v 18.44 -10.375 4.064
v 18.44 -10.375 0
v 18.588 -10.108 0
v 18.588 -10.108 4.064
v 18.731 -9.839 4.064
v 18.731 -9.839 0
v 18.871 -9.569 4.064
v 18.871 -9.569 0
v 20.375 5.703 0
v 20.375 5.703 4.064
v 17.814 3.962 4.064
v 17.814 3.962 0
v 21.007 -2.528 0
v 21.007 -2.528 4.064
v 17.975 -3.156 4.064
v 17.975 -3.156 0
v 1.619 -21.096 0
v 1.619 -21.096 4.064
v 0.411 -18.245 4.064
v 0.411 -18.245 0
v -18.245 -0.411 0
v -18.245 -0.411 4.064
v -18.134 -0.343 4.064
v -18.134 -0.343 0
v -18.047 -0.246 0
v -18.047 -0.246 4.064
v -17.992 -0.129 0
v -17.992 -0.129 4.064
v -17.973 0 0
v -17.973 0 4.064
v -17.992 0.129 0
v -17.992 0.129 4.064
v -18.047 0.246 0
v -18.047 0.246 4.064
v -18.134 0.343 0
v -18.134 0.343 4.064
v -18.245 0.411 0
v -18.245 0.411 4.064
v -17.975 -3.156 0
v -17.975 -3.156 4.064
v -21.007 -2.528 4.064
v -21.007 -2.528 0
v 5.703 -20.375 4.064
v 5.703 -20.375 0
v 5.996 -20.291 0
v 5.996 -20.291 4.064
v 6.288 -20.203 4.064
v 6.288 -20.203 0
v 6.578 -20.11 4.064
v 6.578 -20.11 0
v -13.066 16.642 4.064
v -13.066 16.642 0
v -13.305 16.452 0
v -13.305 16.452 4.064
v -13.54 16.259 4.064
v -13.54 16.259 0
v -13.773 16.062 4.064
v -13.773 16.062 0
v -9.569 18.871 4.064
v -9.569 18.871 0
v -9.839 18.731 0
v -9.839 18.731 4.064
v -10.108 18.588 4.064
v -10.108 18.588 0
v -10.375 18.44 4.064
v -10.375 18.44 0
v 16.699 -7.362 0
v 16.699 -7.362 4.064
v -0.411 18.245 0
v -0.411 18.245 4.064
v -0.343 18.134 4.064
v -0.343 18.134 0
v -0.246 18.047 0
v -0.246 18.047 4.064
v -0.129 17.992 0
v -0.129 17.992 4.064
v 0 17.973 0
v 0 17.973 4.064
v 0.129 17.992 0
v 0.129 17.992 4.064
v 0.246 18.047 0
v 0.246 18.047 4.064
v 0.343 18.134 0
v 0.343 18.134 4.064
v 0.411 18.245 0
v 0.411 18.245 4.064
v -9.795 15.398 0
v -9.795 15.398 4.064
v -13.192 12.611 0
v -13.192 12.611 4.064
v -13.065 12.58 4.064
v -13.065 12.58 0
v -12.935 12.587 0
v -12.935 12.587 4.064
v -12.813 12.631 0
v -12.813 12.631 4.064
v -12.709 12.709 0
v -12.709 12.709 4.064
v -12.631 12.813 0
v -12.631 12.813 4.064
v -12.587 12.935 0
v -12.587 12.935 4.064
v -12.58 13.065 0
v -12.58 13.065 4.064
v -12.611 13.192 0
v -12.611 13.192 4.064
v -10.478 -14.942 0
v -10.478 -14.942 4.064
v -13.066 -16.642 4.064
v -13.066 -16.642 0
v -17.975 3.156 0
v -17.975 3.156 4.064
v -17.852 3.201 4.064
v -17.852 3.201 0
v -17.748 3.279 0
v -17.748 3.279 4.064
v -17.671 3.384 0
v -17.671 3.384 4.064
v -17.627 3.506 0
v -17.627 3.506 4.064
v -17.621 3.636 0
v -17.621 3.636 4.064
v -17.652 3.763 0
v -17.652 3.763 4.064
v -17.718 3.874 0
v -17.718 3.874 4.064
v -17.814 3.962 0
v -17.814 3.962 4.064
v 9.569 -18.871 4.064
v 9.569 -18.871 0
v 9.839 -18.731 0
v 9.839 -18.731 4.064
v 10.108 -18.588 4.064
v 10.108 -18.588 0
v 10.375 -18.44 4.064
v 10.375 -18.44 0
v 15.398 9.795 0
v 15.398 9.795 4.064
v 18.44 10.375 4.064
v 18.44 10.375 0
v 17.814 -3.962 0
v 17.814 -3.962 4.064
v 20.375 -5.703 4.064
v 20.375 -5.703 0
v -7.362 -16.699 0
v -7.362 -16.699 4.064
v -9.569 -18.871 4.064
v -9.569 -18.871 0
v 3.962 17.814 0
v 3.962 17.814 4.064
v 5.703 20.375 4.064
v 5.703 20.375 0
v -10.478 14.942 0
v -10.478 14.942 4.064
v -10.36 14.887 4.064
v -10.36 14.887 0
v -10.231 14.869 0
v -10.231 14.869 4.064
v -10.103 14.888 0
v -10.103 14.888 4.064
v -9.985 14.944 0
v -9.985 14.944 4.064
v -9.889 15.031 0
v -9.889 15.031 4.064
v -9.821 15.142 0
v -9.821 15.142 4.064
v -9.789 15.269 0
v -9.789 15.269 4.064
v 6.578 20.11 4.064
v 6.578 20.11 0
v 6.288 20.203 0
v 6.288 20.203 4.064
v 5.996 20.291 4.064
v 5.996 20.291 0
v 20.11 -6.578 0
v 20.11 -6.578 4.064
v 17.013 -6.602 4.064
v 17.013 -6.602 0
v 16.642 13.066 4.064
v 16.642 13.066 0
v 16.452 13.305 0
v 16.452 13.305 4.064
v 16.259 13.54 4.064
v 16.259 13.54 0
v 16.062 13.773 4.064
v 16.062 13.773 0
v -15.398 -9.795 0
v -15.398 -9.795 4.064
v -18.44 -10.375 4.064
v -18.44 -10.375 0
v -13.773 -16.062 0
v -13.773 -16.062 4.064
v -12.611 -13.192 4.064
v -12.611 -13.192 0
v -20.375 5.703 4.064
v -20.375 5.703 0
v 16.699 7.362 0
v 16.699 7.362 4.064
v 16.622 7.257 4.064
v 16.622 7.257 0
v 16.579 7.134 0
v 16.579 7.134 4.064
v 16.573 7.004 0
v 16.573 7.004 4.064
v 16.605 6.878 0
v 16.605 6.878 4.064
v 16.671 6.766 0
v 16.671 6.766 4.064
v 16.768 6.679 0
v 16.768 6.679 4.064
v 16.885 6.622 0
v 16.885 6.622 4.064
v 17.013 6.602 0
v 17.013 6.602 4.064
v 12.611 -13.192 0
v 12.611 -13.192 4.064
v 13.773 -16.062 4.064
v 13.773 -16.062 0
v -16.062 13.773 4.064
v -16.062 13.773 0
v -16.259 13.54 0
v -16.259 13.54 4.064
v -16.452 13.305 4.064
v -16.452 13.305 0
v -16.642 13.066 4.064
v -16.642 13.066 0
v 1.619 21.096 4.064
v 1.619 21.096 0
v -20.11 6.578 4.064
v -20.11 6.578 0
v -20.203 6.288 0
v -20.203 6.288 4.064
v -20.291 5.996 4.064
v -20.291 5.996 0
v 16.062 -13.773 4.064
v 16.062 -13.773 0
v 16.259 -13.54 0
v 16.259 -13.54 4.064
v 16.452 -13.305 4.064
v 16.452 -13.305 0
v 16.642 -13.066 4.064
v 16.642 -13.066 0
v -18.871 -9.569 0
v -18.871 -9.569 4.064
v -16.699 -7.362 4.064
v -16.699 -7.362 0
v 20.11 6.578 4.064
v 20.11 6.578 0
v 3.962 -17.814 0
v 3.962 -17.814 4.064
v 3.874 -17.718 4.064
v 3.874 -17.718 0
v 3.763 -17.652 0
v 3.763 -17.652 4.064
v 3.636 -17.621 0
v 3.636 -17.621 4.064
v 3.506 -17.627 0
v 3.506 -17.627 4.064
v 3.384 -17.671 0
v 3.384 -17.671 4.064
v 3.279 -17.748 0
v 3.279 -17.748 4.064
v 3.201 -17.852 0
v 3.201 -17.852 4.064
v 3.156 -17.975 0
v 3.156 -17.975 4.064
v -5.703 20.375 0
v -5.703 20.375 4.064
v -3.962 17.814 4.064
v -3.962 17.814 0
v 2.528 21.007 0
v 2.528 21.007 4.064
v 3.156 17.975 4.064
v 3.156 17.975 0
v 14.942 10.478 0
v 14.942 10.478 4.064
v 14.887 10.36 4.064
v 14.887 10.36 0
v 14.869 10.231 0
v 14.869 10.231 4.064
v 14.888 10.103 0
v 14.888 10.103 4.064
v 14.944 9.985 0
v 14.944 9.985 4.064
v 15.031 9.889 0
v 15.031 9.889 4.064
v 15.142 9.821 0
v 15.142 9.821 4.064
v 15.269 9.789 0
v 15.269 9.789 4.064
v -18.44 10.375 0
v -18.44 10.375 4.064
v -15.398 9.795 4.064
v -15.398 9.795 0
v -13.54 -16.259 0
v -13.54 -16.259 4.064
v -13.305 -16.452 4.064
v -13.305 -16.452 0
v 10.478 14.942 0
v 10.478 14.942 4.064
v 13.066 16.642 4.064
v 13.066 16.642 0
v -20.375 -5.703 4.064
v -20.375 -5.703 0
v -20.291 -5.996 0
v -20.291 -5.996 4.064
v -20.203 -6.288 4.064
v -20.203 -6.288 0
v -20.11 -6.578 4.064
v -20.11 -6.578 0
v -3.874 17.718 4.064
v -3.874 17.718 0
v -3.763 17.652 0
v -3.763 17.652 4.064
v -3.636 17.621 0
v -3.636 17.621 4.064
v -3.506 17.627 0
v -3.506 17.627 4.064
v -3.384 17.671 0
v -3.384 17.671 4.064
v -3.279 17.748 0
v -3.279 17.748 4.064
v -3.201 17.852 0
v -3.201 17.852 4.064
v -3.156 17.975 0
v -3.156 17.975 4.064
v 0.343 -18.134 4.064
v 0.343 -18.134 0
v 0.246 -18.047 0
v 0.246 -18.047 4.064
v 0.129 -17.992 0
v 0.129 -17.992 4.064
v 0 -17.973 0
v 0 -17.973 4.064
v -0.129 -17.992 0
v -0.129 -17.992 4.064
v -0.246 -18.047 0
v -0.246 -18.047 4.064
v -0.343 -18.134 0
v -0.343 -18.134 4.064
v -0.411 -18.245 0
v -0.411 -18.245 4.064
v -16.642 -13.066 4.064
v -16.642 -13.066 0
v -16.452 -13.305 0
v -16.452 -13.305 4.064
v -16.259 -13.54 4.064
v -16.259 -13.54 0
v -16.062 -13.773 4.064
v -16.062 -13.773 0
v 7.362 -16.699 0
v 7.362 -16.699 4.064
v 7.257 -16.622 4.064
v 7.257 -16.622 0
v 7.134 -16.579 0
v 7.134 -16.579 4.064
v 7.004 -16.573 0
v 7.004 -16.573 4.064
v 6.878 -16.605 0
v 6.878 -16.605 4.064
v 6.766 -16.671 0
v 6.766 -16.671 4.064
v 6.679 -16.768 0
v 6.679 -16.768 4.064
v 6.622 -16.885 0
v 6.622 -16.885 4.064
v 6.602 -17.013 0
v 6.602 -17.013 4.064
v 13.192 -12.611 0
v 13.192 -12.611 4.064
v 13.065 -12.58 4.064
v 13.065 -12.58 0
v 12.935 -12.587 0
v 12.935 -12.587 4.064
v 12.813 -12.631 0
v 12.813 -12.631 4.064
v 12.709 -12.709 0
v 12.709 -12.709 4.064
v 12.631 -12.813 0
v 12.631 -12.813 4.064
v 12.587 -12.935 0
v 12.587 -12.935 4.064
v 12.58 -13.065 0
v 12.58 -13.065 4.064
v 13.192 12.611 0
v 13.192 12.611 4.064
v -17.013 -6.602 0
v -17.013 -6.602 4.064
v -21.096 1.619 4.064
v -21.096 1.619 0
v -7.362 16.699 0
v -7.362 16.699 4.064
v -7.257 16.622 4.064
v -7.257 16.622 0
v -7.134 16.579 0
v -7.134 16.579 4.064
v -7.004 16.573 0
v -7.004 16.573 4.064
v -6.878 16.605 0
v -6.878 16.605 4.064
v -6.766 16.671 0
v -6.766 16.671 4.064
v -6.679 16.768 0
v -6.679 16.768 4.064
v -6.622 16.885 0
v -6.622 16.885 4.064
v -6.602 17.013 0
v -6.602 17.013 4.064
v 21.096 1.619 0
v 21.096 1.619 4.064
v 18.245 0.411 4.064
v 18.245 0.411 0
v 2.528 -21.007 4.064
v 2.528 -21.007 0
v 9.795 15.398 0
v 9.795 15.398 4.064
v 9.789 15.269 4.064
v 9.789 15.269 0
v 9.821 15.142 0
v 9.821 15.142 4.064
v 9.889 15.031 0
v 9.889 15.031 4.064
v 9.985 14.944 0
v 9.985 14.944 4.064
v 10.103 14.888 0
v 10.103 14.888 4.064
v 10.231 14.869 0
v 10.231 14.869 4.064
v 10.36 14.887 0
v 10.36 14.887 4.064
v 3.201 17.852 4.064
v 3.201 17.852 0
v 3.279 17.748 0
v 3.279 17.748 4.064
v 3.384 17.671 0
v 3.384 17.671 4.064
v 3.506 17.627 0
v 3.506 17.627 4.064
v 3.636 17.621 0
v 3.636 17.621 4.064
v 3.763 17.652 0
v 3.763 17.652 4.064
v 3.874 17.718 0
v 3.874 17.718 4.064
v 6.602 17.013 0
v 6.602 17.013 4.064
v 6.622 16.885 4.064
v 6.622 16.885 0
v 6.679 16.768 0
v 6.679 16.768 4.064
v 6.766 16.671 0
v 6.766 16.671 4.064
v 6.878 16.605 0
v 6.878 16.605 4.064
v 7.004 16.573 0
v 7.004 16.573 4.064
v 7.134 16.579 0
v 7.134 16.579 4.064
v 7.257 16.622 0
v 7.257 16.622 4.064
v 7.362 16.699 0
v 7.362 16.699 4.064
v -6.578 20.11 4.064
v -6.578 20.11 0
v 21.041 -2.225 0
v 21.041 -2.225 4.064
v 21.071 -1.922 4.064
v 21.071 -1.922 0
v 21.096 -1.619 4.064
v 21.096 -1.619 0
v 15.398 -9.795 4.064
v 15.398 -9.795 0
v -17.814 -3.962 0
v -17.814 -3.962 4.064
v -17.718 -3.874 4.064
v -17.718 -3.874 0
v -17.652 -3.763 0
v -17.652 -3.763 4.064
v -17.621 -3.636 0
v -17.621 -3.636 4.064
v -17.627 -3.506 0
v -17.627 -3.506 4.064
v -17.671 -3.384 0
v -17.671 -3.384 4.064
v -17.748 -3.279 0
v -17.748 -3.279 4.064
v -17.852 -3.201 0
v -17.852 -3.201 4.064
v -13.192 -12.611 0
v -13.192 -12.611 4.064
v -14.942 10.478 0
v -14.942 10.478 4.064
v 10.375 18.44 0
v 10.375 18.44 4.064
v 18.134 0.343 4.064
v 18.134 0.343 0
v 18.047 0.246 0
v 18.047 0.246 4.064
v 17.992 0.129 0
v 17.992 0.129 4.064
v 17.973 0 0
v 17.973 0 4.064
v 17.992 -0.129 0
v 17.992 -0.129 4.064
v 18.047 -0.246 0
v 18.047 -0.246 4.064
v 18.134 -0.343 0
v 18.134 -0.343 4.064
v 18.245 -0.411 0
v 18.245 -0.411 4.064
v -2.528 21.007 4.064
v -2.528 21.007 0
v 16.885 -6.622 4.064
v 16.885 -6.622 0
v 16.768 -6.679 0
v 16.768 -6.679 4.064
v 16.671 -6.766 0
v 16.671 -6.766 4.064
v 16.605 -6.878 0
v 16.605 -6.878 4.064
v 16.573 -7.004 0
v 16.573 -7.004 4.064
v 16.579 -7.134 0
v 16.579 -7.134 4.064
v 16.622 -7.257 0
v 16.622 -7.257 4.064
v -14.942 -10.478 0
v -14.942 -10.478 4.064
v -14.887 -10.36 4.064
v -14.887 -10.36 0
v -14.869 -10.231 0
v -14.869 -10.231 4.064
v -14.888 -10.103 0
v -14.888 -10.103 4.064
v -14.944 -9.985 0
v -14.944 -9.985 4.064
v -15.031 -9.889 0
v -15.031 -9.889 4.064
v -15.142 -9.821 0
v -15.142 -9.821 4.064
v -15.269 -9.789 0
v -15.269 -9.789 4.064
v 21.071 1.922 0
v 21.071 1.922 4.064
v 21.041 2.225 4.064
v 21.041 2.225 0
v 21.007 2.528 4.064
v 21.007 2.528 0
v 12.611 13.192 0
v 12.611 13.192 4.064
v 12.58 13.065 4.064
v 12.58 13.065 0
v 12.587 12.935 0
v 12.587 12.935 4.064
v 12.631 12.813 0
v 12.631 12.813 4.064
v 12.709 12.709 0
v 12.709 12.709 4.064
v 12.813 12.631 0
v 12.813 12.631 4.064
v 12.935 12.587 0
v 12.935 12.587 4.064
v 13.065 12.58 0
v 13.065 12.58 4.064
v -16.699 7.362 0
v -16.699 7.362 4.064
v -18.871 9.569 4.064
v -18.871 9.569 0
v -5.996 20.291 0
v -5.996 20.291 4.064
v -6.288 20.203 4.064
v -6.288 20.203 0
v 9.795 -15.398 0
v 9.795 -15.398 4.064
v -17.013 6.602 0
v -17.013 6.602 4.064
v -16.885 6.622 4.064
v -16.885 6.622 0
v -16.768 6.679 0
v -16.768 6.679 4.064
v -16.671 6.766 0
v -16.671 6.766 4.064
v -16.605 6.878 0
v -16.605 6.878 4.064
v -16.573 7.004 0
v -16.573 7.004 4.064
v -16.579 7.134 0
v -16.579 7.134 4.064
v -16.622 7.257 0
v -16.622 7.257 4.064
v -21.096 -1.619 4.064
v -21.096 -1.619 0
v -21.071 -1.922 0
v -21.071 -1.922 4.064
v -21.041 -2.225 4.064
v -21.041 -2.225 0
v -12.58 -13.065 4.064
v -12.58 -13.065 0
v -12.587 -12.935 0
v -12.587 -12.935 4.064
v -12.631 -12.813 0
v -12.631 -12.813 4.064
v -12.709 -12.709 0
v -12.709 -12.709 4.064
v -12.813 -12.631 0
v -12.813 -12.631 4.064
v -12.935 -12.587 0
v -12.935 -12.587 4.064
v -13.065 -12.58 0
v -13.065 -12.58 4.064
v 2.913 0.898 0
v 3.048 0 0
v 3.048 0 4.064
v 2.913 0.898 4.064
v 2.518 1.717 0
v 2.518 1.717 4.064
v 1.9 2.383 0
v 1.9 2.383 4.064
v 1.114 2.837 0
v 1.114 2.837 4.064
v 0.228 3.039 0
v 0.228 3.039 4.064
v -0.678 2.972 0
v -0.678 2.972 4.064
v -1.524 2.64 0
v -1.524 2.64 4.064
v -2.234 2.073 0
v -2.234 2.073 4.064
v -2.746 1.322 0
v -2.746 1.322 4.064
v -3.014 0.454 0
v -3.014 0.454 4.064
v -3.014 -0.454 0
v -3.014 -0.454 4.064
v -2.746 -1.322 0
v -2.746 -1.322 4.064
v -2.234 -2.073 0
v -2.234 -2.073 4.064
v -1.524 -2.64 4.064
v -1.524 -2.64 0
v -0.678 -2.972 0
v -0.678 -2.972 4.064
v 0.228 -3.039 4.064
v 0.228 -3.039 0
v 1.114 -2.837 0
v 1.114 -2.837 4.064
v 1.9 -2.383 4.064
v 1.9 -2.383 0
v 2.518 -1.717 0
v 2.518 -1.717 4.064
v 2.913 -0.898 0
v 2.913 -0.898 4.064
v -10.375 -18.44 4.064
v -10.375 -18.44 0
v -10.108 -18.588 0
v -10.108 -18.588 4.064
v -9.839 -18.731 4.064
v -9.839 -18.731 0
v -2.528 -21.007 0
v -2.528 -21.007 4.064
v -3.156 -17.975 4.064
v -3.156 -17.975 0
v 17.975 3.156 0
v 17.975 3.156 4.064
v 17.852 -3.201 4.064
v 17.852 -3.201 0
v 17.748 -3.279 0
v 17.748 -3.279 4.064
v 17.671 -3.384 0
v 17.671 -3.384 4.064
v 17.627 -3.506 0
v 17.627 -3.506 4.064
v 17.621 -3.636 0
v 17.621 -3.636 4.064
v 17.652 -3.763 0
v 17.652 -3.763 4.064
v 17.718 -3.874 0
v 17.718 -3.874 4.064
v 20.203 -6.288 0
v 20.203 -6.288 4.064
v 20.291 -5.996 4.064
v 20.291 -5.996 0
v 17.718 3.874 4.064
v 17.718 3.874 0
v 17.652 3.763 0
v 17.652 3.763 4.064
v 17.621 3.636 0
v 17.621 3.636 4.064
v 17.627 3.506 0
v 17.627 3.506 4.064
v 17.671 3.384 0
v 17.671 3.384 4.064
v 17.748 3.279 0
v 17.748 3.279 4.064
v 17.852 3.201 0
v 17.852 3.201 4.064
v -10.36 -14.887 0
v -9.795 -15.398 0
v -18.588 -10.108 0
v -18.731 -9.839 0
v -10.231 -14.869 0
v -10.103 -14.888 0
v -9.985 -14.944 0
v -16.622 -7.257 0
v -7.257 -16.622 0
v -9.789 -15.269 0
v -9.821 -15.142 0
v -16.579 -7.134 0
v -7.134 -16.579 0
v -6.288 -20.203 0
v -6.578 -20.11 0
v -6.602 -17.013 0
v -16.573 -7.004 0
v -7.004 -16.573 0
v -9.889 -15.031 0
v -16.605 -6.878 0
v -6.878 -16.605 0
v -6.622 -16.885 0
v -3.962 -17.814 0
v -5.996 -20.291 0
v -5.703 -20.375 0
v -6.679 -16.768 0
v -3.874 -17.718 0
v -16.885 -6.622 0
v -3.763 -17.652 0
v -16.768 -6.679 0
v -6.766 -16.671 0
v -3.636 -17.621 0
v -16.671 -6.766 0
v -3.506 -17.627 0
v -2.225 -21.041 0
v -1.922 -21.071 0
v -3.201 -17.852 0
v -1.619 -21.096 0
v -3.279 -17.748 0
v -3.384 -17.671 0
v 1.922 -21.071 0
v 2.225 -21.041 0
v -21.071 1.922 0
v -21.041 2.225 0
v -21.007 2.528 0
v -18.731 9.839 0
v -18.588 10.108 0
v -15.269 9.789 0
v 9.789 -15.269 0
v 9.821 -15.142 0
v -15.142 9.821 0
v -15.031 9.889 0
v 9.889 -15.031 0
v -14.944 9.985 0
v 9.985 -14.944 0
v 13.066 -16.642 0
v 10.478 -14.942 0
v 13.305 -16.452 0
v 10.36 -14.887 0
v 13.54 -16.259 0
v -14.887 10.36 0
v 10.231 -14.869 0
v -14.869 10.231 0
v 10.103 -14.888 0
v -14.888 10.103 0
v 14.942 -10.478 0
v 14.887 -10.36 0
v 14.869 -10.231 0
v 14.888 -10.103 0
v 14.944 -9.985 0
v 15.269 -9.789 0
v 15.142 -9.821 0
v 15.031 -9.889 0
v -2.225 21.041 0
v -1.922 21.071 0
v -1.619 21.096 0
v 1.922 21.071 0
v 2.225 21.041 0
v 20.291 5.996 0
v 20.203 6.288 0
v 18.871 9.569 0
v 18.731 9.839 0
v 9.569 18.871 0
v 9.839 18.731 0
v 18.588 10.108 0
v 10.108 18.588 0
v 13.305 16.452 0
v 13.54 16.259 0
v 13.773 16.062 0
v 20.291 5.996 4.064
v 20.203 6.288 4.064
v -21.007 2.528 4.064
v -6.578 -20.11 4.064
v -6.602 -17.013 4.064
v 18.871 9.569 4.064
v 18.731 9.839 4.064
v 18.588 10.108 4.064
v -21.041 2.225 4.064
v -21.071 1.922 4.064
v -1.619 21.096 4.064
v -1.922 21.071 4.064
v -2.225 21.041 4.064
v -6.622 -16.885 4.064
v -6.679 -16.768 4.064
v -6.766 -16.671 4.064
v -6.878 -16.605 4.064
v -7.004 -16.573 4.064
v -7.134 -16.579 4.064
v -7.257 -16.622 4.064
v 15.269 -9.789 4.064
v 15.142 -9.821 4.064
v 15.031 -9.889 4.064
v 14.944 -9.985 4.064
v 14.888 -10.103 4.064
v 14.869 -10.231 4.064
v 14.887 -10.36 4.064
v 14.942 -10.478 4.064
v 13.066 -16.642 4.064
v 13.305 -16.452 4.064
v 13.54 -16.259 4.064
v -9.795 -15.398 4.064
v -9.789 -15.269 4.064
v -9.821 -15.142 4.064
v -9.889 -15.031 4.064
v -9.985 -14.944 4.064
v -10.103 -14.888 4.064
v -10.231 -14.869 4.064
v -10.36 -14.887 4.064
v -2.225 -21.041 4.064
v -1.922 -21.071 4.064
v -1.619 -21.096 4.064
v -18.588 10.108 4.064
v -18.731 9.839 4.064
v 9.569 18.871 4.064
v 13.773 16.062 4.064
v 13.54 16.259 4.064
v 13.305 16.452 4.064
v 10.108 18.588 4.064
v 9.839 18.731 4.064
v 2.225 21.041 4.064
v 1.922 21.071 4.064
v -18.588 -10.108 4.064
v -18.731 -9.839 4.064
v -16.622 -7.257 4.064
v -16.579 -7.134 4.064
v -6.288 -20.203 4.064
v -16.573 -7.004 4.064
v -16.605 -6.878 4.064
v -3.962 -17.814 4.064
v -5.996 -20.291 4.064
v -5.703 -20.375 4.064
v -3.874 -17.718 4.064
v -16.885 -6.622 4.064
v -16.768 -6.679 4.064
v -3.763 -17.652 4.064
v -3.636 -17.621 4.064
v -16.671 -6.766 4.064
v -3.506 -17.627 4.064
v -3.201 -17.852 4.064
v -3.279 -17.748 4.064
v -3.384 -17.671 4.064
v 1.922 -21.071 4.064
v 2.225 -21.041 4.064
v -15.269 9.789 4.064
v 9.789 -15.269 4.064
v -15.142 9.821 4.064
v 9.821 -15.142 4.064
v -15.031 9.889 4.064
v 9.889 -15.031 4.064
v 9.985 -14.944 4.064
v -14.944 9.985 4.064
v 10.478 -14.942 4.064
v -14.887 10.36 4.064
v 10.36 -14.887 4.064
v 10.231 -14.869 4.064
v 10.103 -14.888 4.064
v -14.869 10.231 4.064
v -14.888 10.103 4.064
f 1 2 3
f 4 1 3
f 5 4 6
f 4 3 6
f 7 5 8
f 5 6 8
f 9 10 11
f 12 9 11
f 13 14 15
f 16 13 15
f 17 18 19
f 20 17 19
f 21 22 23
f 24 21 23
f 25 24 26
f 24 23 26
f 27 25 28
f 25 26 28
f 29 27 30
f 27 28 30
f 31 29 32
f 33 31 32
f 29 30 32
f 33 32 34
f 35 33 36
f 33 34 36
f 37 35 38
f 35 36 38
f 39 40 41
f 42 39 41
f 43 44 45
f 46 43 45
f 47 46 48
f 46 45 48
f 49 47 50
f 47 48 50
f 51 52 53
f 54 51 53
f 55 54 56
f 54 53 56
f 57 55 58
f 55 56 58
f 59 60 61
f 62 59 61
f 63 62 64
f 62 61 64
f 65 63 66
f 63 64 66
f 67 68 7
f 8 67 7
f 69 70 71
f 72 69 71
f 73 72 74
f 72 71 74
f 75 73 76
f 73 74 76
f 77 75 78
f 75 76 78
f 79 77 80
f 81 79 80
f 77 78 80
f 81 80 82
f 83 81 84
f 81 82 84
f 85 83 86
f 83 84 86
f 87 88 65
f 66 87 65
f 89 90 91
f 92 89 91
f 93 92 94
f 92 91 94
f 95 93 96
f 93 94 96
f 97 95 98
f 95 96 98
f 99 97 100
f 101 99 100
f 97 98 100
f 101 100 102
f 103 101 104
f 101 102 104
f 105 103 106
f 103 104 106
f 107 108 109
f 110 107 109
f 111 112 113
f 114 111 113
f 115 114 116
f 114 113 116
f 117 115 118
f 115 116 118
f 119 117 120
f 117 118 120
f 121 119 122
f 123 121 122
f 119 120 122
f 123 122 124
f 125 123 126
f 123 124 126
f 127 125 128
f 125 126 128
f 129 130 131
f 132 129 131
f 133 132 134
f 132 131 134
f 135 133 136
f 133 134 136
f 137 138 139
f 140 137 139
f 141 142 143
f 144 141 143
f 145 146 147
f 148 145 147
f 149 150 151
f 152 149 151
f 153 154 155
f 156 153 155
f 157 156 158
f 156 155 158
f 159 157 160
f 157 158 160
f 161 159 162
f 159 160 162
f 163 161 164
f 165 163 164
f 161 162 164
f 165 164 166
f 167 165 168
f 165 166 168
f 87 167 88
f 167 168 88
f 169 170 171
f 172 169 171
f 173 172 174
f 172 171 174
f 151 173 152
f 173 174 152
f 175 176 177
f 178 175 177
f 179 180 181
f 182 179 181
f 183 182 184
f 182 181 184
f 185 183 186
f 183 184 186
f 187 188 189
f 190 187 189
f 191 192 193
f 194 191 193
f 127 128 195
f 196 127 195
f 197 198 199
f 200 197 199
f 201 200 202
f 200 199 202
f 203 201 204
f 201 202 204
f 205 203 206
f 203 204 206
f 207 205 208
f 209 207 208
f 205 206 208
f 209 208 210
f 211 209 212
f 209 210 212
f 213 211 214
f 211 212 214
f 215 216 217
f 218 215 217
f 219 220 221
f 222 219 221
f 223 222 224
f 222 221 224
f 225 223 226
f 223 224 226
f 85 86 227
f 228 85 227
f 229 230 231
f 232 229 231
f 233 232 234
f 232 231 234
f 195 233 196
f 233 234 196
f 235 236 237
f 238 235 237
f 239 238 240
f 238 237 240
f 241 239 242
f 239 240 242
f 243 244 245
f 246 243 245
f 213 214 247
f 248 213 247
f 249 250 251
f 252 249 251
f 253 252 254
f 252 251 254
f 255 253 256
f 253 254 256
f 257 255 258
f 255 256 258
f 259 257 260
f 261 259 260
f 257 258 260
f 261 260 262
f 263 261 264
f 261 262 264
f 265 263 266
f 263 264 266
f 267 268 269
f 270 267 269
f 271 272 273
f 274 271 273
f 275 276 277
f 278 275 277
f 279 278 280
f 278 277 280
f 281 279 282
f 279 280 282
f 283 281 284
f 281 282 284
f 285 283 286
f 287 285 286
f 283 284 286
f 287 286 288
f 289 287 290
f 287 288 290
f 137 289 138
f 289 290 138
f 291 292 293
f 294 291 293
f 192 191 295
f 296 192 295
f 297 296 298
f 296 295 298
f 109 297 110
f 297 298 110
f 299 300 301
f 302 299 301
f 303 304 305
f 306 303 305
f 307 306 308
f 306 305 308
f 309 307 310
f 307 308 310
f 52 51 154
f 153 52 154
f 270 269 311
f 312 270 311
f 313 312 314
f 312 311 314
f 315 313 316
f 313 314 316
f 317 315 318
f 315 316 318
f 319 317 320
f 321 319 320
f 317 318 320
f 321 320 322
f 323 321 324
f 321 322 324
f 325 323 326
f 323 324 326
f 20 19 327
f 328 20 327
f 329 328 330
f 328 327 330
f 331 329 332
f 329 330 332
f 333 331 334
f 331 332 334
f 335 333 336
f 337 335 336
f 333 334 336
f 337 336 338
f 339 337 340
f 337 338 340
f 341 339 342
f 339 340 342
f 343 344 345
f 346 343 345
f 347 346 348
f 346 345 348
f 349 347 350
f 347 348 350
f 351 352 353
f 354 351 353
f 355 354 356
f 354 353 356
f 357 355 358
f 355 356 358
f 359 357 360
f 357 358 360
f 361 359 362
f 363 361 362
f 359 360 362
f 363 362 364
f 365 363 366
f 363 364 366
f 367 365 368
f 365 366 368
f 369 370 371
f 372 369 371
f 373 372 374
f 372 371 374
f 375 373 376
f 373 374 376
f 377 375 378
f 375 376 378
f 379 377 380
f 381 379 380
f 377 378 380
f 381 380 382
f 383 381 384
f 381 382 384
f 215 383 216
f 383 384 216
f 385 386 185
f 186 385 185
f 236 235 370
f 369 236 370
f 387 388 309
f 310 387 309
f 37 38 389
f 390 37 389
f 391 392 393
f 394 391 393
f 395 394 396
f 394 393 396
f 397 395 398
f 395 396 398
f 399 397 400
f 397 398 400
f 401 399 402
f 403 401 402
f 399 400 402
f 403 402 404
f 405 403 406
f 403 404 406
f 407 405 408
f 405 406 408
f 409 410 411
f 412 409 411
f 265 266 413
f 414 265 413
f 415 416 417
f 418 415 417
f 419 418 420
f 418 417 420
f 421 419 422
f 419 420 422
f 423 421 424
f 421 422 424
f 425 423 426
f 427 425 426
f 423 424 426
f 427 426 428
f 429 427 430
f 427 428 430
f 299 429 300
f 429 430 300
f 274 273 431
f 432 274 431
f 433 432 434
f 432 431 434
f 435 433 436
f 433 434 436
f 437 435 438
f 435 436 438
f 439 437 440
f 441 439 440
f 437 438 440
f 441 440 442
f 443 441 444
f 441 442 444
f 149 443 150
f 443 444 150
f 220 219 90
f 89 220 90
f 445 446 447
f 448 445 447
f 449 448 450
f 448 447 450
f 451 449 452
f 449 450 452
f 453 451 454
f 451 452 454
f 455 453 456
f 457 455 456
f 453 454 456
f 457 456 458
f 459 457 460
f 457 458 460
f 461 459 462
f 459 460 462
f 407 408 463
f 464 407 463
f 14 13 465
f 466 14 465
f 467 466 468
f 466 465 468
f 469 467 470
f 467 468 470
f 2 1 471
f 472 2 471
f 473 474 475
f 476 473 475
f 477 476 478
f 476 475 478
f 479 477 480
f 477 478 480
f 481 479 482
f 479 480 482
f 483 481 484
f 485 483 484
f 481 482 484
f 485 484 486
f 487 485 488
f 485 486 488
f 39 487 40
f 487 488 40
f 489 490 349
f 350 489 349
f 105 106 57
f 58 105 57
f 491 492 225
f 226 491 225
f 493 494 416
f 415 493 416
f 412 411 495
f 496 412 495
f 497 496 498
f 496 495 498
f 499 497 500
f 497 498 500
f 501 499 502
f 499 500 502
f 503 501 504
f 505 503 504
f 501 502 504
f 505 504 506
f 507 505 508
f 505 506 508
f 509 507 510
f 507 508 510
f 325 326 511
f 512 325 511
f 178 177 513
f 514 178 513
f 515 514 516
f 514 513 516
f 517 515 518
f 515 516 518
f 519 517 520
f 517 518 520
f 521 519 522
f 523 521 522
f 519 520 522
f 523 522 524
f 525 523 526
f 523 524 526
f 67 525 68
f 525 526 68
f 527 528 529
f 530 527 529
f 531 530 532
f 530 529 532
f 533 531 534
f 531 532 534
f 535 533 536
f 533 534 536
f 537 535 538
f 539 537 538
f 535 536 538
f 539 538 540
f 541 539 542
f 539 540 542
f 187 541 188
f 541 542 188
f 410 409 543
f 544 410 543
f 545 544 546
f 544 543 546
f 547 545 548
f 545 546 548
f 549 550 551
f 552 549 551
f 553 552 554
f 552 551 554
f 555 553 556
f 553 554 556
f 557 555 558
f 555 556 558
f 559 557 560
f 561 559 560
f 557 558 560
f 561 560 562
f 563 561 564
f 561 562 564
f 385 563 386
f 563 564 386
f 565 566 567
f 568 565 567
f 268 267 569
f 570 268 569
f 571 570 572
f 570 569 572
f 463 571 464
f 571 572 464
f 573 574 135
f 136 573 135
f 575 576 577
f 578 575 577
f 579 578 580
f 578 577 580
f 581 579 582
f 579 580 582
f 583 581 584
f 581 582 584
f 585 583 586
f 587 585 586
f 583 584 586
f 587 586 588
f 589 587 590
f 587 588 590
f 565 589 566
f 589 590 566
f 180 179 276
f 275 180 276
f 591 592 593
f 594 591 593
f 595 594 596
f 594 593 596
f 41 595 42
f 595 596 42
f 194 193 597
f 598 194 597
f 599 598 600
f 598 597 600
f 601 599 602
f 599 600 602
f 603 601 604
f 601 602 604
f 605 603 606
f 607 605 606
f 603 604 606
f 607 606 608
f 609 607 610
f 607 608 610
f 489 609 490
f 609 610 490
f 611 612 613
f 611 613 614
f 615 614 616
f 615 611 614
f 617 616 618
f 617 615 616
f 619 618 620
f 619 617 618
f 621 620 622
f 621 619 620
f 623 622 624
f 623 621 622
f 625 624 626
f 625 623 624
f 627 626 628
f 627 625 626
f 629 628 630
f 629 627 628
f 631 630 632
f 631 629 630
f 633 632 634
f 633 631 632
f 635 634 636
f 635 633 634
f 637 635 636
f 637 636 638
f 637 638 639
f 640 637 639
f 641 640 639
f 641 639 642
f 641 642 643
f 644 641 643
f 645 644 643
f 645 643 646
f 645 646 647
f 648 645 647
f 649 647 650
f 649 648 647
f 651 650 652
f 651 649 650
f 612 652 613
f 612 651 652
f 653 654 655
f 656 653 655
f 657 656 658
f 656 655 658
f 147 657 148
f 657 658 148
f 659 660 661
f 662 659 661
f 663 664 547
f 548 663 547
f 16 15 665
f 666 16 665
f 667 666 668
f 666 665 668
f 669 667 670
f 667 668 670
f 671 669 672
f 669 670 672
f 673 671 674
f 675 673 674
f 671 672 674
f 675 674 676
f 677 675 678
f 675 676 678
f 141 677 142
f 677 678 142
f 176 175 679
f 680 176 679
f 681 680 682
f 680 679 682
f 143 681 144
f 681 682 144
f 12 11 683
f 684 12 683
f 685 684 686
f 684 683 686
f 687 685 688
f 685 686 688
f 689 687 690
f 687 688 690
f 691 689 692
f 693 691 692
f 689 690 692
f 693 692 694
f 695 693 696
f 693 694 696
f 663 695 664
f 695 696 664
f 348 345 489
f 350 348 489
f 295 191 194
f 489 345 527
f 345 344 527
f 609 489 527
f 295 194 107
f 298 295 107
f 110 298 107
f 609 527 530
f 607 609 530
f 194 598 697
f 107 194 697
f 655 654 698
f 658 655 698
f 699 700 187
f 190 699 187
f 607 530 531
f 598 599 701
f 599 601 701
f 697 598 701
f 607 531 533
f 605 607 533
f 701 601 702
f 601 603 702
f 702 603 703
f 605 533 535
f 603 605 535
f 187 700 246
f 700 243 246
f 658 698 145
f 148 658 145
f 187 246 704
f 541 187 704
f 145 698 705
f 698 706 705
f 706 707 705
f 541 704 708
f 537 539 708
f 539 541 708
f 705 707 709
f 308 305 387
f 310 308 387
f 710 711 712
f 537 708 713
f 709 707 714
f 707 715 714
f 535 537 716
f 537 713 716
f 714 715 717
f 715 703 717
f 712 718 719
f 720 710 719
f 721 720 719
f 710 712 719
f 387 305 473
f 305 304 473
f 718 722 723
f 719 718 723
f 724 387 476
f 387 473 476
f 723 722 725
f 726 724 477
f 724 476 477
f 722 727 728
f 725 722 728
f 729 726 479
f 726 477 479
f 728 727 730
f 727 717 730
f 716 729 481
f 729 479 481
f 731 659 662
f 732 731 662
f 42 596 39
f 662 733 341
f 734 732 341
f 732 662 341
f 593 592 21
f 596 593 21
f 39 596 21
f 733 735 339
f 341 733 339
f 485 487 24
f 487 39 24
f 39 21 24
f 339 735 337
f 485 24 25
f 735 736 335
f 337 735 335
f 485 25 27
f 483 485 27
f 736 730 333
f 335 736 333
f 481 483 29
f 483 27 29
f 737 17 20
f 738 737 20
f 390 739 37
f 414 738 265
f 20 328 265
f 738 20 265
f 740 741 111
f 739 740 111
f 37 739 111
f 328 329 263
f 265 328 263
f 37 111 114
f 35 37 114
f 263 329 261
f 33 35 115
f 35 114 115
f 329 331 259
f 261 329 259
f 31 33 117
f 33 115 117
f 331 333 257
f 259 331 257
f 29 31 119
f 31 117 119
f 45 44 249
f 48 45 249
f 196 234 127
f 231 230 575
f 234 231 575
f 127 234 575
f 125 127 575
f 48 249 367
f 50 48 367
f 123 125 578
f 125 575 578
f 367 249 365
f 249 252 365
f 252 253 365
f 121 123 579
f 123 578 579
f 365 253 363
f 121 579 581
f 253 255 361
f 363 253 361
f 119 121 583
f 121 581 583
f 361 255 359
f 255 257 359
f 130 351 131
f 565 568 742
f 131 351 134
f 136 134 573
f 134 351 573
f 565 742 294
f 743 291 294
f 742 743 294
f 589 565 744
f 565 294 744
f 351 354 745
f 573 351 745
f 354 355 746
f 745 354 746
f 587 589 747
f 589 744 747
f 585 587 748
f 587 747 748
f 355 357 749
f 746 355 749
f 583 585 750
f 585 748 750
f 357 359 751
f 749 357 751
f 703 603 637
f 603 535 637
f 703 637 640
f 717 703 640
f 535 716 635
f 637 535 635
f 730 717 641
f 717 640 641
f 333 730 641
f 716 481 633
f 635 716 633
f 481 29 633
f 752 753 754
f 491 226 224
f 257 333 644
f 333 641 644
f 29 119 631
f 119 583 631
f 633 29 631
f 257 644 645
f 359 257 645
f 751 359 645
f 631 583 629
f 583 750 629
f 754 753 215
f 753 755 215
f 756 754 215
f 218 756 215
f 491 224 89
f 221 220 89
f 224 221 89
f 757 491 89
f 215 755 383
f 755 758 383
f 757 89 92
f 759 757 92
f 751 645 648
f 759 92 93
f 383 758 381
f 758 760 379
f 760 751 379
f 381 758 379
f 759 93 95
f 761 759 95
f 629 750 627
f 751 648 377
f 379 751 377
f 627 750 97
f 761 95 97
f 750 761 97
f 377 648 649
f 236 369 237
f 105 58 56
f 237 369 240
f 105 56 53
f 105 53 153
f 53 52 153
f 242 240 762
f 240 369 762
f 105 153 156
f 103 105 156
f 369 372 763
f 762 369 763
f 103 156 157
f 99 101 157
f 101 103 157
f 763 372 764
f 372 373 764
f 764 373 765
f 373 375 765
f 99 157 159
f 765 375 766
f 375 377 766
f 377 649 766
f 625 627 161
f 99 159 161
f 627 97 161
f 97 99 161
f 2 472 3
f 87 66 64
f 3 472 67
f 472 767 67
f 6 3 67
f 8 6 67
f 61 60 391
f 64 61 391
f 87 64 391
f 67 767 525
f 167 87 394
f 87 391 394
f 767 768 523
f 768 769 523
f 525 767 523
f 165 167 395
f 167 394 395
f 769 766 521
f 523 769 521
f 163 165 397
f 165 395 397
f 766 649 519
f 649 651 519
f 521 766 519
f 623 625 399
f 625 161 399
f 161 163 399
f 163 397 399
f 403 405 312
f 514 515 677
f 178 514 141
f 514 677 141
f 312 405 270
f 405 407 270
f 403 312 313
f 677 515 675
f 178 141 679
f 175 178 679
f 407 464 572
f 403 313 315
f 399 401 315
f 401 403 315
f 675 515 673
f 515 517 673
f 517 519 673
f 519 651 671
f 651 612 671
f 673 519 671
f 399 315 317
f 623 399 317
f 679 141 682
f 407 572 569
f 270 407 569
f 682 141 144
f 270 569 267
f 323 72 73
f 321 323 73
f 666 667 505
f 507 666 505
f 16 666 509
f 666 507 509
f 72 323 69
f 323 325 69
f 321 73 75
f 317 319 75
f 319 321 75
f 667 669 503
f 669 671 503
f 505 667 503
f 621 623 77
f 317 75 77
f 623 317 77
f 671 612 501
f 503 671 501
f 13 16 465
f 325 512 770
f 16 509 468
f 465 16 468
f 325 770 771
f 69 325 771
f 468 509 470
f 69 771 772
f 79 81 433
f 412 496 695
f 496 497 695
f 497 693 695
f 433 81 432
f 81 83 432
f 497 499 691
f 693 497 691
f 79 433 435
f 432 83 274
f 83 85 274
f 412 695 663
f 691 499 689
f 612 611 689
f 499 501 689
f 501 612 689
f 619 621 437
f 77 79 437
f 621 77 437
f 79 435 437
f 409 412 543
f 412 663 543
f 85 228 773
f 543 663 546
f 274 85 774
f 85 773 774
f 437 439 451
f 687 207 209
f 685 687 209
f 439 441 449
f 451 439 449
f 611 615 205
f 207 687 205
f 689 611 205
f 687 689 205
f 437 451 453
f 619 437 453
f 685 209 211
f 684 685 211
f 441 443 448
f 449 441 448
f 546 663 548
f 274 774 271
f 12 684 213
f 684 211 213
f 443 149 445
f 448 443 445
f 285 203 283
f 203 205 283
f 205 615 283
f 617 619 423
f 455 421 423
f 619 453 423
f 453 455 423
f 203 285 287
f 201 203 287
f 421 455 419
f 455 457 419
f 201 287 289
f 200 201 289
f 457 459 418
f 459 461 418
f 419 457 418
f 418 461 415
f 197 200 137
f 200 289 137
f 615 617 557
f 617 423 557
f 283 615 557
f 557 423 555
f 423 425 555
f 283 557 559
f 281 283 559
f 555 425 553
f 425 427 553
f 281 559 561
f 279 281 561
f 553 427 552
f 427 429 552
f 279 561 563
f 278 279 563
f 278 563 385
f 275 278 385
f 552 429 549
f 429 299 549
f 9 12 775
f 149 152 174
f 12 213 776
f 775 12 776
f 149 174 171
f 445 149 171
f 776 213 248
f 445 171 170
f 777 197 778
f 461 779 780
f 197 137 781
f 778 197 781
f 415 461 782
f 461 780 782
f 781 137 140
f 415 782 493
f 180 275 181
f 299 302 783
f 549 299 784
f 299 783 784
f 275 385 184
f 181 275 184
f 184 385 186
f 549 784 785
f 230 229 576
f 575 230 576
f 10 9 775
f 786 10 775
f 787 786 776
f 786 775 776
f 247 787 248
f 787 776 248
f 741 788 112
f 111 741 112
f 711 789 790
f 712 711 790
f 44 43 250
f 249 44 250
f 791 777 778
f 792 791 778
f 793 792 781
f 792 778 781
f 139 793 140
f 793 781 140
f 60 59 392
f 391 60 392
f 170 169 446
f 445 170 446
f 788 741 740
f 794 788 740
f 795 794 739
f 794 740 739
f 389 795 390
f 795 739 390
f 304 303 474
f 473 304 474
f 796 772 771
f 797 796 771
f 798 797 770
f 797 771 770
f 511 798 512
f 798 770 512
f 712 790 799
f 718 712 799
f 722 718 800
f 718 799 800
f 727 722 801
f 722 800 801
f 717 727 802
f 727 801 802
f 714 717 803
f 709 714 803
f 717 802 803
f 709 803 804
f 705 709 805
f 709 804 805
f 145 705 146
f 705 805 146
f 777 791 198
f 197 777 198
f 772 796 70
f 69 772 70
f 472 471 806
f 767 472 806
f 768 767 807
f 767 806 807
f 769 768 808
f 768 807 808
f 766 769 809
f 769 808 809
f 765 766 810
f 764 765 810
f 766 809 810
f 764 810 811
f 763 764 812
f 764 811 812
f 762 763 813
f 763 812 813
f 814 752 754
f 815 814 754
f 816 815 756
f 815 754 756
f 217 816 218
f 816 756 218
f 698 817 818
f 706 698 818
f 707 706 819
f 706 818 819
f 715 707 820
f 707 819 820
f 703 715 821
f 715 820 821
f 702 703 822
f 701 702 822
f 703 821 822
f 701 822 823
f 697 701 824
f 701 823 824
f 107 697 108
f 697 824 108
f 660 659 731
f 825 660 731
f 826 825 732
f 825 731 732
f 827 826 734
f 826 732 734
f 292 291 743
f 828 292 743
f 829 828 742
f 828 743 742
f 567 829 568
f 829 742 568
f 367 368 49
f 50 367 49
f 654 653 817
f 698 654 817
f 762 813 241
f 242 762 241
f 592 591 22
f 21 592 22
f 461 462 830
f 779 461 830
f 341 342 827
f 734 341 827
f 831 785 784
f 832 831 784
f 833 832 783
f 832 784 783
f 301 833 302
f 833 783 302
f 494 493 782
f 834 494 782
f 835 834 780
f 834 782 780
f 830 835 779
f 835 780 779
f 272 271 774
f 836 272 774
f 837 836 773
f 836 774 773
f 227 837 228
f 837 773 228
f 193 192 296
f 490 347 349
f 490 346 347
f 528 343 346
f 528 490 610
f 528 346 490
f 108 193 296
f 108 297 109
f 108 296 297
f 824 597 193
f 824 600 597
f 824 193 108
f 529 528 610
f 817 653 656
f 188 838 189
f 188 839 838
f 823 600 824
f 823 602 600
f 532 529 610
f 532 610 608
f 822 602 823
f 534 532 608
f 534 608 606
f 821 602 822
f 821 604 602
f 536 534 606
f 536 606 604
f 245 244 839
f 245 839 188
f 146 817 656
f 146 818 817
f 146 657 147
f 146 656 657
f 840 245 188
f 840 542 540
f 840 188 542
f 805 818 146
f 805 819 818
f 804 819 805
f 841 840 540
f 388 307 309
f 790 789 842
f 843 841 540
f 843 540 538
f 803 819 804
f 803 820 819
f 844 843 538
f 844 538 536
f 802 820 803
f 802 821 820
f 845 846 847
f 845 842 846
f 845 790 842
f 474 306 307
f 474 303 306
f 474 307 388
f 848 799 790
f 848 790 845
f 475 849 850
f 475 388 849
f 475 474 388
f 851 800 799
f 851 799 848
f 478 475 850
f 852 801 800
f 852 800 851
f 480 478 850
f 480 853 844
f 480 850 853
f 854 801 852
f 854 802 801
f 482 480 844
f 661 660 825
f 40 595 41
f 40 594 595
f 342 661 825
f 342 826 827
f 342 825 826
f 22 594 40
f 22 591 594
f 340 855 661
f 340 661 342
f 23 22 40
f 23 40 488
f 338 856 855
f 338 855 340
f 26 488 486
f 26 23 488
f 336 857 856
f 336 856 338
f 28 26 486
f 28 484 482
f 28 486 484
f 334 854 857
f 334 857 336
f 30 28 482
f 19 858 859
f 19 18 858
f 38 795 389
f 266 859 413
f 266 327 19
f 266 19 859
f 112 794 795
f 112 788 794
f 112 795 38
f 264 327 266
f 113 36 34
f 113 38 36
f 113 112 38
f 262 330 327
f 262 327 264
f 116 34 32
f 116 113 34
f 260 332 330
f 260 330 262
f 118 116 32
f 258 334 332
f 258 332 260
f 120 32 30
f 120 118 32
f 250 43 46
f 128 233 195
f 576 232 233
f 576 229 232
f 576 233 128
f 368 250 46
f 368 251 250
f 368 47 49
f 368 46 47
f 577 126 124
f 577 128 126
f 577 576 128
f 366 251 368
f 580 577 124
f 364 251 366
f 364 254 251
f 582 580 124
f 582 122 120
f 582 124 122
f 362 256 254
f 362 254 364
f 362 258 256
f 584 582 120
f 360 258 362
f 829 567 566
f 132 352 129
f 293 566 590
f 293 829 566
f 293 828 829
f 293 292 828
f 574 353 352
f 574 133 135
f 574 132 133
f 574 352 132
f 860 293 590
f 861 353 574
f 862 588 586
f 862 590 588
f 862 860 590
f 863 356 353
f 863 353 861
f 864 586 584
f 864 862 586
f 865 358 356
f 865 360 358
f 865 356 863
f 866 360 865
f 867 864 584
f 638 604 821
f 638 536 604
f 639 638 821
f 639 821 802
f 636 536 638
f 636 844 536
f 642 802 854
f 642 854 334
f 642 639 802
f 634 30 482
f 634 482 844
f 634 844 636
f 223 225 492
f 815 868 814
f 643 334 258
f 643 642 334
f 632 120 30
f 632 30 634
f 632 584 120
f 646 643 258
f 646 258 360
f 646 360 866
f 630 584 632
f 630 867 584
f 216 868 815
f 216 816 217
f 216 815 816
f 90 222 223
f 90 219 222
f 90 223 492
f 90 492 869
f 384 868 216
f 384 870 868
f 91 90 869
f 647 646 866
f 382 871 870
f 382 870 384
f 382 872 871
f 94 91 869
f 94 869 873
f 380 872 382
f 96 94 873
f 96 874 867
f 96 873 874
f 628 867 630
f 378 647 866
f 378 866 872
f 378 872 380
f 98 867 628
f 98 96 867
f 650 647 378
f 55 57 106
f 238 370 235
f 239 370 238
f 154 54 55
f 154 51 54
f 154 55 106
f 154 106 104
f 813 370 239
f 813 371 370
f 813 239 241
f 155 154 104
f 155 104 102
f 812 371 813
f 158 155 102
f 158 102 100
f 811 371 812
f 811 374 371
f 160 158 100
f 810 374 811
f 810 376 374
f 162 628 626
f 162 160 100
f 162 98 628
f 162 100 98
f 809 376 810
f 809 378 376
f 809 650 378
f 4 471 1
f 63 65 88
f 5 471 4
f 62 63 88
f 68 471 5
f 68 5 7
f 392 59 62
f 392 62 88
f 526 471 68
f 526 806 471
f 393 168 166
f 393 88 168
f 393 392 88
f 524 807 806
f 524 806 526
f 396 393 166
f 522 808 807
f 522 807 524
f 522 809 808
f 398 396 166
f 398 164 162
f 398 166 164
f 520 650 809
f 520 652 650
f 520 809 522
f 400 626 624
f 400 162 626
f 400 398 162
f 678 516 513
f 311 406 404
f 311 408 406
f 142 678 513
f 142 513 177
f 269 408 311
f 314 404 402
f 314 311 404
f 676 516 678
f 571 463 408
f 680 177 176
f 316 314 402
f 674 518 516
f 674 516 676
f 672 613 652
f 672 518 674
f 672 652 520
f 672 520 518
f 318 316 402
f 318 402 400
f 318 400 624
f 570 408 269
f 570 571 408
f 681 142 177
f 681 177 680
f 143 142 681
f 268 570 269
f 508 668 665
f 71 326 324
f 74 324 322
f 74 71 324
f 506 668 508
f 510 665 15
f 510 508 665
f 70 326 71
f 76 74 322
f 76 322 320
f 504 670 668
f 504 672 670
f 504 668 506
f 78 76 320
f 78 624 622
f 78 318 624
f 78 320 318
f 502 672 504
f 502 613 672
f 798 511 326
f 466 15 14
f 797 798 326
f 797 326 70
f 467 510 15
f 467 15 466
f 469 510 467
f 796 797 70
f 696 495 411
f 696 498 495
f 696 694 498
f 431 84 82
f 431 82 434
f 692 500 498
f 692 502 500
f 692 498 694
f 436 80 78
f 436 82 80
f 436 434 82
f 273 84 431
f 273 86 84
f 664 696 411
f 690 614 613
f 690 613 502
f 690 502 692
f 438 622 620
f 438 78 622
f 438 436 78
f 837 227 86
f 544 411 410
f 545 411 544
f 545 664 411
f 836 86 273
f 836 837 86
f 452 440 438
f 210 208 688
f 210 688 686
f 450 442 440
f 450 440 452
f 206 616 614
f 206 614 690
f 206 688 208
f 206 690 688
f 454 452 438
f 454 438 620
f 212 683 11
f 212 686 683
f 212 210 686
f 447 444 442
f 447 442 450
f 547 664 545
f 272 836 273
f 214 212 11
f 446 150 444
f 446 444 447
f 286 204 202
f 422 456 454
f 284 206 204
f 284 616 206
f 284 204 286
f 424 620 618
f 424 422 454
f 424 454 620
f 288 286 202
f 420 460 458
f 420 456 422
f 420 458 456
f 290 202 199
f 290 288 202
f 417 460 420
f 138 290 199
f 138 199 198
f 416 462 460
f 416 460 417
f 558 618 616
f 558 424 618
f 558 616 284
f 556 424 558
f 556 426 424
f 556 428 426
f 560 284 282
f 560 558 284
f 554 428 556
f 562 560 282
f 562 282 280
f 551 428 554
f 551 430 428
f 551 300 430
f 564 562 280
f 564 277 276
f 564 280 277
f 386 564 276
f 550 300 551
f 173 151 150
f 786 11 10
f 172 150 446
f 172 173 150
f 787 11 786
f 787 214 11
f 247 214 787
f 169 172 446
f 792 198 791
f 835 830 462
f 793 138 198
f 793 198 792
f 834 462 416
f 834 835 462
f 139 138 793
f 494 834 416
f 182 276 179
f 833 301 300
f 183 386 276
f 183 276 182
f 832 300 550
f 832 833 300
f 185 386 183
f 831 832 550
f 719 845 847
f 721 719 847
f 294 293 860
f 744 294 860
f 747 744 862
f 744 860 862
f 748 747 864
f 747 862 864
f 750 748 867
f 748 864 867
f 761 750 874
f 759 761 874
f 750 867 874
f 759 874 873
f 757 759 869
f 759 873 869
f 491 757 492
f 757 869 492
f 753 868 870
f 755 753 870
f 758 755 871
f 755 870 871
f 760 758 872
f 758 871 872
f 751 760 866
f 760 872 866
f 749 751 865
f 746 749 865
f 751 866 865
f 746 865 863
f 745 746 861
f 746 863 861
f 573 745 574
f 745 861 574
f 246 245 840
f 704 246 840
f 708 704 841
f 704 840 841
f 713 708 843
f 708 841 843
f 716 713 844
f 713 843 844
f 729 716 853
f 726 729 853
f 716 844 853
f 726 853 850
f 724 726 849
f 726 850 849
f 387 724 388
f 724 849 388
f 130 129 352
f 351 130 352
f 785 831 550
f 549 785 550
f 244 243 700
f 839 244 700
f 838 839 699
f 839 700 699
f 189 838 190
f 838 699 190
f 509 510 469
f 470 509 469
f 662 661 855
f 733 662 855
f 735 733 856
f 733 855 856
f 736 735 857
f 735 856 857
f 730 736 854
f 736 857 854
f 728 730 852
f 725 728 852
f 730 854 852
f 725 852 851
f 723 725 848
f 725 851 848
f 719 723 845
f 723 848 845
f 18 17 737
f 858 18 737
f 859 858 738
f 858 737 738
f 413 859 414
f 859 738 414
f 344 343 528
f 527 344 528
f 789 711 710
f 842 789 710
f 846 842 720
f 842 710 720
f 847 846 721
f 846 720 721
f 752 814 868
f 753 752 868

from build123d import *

# Parameters (mm, degrees)
F0_R            = 21.158401666
F0_R_2          = 3.048
F1_DEPTH        = 4.064
F3_DEPTH        = 4.064
F3_COPIES_COUNT = 32


# Not quite as in the source:
# - a pattern or mirror of a feature is missing from the dataset's text; its kind, count and spacing are read off the source's solid


with BuildPart() as f1:
    # F0 (on Top) → F1 (new body)
    with BuildSketch(Plane.XY):
        Circle(F0_R)
        Circle(F0_R_2, mode=Mode.SUBTRACT)
    extrude(amount=F1_DEPTH)

    # F2 (on face) → F3 (cut, through all)
    with BuildSketch(Plane.XY.offset(4.064)):
        with BuildLine():
            Line((-0.4109729921, -18.2450008044), (-1.6185707702, -21.0964022933))
            ThreePointArc((-1.6185707702, -21.0964022933), (0, -21.158401666), (1.6185707702, -21.0964022933))
            Line((1.6185707702, -21.0964022933), (0.4109729921, -18.2450008044))
            ThreePointArc((0.4109729921, -18.2450008044), (0, -17.9727420469), (-0.4109729921, -18.2450008044))
        make_face()
    f3 = extrude(amount=-F3_DEPTH, mode=Mode.SUBTRACT)

    # F3_copies: F3 ×32 about axis
    f3_copies_axis = Axis((0, 0, 0), (0, 0, 1))
    for i in range(1, F3_COPIES_COUNT):
        add(f3.rotate(f3_copies_axis, i * 360 / F3_COPIES_COUNT), mode=Mode.SUBTRACT)


solid = f1.part
